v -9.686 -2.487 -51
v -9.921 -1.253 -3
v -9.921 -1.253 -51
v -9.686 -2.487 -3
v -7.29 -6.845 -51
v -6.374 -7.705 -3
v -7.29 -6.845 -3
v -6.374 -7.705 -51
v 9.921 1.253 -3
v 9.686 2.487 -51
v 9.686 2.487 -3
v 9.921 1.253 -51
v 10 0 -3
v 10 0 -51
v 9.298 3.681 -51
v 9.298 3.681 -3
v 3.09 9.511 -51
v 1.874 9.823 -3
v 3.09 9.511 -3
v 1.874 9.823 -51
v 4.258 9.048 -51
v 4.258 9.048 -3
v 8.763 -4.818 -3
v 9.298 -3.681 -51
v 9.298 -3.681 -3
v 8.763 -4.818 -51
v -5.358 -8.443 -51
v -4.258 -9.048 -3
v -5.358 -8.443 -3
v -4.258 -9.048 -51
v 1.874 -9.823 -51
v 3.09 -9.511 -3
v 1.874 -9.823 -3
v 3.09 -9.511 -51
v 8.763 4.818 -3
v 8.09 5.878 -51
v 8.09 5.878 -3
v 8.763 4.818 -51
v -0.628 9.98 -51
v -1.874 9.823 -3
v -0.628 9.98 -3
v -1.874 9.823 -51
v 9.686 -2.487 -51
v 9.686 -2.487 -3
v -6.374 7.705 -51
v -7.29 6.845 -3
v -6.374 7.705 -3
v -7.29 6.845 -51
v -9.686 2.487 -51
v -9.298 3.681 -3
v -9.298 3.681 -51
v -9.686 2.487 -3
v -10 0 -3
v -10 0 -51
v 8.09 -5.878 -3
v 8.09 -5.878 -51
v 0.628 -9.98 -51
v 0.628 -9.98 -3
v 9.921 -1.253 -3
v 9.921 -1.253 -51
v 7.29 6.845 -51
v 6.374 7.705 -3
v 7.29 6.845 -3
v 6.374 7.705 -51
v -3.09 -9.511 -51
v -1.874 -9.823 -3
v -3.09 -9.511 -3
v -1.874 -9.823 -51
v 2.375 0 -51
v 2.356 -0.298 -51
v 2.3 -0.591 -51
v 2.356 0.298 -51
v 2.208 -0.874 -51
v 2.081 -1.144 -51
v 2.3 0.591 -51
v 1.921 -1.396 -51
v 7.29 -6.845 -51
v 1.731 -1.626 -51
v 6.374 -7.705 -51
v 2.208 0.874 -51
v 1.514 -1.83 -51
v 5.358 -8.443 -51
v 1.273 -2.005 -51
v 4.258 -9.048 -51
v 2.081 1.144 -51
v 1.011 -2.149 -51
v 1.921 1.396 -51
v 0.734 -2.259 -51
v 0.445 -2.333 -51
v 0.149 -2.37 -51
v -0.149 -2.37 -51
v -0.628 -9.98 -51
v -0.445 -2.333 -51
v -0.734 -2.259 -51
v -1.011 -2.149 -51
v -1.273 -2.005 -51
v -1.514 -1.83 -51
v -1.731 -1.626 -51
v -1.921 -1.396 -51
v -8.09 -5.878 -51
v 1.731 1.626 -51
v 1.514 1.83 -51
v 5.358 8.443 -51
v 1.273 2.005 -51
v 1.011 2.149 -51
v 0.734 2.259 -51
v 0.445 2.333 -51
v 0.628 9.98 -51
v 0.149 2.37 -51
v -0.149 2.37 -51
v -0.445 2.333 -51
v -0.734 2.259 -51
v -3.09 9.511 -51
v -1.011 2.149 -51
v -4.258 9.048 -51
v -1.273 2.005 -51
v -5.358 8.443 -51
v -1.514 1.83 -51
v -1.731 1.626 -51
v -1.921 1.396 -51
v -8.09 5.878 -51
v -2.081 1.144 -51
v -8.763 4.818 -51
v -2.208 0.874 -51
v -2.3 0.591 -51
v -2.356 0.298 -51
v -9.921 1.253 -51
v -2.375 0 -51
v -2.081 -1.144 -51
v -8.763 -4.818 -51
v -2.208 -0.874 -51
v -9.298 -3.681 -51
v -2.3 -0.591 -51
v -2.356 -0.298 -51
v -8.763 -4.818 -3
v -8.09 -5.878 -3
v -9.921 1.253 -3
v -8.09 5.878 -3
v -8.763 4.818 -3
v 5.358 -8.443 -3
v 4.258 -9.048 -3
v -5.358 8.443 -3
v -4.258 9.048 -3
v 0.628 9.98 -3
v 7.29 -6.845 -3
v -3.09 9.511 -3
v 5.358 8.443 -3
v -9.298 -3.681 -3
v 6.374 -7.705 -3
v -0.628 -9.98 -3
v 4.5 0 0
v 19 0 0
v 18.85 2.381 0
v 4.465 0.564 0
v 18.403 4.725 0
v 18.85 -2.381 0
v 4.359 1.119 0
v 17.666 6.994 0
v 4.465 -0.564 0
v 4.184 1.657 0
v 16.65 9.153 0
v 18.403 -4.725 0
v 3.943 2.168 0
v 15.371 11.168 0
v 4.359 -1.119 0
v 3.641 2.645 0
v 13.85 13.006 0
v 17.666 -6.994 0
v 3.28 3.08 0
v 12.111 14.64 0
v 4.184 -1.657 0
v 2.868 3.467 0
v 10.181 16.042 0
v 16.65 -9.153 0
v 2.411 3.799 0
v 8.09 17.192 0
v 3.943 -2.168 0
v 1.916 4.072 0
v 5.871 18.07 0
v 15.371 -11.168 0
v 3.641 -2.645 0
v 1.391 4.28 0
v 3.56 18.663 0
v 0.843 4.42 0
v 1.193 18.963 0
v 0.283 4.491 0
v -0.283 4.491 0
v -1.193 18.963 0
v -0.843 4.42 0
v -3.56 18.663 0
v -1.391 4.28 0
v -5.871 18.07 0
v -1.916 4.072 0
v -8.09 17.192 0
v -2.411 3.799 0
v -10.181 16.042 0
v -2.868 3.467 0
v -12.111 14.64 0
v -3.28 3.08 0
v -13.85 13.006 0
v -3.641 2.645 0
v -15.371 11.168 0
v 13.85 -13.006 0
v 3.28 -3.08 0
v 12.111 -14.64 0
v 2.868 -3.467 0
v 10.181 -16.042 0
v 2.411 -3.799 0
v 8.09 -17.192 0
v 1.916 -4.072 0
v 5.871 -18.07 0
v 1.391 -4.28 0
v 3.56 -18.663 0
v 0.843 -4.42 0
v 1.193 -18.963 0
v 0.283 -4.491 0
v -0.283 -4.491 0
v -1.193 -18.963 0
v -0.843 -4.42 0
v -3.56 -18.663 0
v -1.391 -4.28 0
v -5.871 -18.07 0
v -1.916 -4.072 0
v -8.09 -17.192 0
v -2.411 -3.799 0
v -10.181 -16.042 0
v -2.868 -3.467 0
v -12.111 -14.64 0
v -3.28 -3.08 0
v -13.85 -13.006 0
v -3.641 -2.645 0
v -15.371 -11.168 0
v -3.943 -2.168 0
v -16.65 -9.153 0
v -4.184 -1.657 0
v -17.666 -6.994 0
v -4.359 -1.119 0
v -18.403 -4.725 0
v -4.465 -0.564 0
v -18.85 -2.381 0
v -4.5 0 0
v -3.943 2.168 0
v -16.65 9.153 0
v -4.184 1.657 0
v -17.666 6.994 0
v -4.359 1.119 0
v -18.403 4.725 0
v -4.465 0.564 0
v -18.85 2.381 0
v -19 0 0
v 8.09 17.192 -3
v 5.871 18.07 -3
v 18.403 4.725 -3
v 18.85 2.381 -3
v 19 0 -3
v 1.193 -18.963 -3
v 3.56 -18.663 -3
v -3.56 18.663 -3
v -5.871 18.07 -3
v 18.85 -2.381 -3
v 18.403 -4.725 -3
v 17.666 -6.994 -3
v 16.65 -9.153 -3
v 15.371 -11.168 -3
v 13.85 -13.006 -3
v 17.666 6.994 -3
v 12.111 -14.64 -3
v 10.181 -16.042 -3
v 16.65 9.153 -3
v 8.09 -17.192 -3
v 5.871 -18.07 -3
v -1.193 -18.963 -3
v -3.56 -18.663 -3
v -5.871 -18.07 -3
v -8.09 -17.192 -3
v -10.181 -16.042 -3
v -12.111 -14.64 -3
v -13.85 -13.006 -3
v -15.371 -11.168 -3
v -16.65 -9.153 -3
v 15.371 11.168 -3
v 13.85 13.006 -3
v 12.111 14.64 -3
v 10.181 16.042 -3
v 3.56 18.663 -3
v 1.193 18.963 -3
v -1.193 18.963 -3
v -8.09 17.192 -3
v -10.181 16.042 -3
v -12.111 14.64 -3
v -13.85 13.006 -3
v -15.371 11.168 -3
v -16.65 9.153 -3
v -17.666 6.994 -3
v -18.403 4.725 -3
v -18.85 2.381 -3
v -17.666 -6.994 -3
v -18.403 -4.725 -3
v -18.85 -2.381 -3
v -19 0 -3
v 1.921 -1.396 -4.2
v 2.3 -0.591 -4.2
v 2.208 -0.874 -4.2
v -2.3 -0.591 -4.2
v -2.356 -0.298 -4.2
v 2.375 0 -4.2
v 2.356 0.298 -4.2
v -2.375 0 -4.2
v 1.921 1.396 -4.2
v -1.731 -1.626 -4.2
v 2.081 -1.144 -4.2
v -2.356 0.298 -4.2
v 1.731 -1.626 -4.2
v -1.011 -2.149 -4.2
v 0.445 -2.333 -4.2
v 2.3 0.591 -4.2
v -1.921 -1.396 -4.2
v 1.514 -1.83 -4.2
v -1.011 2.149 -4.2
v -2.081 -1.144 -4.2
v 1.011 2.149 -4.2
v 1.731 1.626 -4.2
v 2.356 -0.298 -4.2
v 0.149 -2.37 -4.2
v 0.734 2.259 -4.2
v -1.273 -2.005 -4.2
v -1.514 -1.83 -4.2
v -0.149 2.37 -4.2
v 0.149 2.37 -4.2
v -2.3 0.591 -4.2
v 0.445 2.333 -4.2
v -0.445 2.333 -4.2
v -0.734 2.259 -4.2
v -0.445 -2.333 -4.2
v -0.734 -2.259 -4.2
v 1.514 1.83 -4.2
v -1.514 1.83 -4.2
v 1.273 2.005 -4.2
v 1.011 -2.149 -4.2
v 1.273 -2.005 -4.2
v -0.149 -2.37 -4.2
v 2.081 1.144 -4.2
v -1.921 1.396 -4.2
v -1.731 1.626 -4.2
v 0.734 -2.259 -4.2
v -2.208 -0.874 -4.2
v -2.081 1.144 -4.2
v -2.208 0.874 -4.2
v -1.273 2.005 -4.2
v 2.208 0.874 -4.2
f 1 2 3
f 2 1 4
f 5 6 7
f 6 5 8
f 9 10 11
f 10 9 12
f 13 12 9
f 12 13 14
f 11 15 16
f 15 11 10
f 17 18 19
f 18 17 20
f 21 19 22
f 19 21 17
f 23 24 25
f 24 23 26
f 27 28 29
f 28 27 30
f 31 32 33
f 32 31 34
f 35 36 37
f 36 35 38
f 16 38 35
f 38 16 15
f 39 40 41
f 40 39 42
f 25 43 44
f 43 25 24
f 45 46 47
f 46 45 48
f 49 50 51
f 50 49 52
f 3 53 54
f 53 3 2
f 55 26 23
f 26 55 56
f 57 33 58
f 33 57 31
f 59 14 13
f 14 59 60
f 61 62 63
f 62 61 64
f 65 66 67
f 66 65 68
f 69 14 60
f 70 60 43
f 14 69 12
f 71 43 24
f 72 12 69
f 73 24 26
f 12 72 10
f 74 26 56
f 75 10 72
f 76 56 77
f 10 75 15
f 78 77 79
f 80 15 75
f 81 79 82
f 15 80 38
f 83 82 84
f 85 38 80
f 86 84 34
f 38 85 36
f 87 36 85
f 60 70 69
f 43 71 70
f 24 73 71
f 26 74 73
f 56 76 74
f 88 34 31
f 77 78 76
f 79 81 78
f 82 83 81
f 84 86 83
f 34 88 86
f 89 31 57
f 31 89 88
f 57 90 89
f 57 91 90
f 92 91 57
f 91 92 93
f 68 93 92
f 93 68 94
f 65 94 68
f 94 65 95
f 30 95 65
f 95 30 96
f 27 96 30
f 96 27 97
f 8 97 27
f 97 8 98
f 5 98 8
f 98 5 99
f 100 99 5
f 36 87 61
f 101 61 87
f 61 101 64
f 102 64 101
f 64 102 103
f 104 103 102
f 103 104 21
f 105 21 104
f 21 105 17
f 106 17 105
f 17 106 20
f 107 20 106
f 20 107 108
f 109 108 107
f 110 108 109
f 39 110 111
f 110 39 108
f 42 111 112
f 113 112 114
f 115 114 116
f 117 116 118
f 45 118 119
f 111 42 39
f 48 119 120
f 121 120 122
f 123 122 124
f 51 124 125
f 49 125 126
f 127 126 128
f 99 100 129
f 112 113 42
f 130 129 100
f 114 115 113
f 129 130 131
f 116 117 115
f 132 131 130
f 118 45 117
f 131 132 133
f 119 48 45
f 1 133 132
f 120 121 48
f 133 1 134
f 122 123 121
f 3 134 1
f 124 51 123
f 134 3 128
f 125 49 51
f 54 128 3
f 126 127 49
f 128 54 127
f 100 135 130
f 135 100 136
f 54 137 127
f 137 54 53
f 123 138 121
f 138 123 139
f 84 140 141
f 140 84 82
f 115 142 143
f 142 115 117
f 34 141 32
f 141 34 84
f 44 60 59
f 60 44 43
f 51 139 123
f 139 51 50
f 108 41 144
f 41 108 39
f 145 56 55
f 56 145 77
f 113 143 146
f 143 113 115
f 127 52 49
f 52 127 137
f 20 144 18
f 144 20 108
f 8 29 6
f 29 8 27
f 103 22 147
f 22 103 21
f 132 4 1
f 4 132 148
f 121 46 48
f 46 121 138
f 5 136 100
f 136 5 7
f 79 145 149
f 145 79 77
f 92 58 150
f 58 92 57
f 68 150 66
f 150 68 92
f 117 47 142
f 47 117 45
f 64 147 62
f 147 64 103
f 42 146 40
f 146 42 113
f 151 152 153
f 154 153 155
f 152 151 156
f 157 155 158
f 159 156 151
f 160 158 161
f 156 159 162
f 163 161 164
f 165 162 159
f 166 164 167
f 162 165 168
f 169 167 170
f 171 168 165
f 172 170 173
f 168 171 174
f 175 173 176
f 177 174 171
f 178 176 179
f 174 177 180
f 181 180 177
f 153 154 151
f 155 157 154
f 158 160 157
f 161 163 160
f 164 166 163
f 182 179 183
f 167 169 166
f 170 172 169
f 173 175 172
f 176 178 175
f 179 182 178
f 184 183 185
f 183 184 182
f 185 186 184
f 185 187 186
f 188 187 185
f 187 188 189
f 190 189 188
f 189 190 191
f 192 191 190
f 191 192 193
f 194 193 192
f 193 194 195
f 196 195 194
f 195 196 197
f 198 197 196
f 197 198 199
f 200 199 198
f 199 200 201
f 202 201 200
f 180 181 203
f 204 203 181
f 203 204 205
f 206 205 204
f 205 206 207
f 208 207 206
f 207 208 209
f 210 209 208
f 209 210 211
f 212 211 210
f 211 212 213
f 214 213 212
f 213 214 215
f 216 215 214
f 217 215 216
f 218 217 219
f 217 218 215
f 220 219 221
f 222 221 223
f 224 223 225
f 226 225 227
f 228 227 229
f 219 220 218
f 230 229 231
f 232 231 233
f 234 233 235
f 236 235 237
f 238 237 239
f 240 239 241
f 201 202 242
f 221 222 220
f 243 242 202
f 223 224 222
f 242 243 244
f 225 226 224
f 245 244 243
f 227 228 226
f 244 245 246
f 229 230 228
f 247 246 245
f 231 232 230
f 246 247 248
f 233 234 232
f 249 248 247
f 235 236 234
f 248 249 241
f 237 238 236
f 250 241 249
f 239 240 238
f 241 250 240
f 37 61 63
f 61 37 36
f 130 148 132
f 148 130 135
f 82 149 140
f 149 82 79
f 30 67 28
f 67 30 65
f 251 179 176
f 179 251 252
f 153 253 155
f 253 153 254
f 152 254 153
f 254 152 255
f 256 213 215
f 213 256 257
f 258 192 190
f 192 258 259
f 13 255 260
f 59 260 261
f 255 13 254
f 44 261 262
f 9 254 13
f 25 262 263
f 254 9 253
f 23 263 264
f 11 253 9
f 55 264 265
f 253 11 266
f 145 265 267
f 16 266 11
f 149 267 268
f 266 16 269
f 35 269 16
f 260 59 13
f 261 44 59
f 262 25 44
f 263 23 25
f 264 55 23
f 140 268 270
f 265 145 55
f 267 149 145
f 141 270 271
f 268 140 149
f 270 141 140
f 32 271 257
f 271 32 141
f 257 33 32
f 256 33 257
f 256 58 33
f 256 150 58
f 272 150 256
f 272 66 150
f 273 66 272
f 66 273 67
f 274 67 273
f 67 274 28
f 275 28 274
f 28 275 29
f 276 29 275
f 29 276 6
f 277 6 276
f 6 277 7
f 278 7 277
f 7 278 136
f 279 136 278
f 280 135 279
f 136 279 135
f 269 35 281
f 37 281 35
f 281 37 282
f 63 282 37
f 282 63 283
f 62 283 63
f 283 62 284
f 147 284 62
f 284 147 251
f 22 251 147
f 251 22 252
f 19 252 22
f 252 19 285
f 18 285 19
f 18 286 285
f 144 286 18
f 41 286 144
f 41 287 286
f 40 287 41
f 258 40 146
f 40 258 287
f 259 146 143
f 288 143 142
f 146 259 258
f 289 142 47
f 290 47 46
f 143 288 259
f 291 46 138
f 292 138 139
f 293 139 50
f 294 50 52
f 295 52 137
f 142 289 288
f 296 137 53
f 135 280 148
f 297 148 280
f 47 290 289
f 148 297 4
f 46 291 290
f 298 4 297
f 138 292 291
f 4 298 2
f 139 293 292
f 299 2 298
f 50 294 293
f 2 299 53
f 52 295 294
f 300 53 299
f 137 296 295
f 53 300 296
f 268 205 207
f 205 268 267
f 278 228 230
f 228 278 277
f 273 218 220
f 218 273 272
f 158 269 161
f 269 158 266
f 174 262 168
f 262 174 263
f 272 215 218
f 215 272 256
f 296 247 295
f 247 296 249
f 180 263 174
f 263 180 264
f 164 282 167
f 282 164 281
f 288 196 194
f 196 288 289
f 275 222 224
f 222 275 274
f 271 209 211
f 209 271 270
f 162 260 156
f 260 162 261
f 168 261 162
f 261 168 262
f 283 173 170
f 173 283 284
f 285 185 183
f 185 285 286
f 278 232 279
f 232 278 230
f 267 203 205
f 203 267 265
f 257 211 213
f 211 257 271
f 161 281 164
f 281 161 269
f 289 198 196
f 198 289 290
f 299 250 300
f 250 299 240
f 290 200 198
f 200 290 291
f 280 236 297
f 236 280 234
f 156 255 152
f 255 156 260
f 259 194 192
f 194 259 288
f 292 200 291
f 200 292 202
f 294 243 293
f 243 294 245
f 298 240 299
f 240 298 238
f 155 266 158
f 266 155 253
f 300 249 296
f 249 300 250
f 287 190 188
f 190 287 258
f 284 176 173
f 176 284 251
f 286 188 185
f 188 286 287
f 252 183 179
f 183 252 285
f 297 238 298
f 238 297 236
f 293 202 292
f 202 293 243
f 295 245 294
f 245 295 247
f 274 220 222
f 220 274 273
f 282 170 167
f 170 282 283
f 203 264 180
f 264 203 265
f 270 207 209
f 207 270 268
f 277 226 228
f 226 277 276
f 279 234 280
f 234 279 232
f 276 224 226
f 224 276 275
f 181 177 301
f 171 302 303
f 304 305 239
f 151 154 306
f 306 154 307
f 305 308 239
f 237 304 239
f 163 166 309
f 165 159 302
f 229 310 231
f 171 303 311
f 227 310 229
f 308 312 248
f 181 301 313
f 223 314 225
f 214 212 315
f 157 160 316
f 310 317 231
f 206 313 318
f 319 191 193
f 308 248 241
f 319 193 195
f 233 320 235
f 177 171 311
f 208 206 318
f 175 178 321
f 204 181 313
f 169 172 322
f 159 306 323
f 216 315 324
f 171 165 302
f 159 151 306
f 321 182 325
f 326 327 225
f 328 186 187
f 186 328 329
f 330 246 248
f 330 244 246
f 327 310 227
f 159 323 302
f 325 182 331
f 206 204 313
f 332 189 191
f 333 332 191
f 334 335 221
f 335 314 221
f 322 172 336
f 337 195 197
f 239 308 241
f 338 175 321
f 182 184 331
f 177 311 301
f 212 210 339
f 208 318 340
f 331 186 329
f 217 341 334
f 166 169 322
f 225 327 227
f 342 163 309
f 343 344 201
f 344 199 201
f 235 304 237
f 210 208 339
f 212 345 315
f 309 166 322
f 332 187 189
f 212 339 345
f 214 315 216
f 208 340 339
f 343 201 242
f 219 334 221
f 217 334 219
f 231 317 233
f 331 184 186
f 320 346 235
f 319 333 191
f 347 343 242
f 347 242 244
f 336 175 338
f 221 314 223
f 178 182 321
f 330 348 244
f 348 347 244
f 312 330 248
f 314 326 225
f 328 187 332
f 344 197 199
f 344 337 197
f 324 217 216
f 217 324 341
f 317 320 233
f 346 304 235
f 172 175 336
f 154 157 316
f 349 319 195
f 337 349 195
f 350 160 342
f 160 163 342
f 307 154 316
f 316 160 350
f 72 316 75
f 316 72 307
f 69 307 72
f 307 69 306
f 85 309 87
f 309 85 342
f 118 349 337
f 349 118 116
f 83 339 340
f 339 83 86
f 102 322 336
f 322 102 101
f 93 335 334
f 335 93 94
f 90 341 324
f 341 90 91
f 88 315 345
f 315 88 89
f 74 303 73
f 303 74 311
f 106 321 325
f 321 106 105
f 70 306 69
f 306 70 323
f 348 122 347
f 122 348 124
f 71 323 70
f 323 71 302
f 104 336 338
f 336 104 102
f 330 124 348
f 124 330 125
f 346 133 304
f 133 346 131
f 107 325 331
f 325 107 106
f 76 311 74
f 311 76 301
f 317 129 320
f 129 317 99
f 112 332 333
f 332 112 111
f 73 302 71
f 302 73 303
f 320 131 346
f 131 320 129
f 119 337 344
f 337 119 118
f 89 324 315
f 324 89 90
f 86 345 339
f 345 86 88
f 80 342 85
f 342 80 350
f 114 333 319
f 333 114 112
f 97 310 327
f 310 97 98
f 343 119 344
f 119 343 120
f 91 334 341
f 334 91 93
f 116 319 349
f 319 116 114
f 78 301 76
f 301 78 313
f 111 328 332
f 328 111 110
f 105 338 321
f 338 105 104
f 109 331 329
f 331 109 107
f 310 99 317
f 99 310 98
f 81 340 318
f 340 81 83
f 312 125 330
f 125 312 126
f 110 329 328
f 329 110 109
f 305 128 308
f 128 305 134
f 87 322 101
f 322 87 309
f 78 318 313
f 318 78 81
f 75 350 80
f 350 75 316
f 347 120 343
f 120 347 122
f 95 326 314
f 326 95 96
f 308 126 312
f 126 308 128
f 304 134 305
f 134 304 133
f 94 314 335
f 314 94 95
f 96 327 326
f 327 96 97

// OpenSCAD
$fn = 50;


difference() {
	union() {
		translate(v = [0, 0, -51.0000000000]) {
			cylinder(h = 51, r = 10.0000000000);
		}
		translate(v = [0, 0, -3.0000000000]) {
			cylinder(h = 3, r = 19.0000000000);
		}
	}
	union() {
		translate(v = [0, 0, 0]) {
			rotate(a = [0, 0, 0]) {
				difference() {
					union() {
						#translate(v = [0, 0, -51.0000000000]) {
							cylinder(h = 51, r = 2.2500000000);
						}
						#translate(v = [0, 0, -4.2000000000]) {
							cylinder(h = 4.2000000000, r = 10.0000000000, r1 = 2.3750000000, r2 = 4.5000000000);
						}
						#translate(v = [0, 0, -51.0000000000]) {
							cylinder(h = 51, r = 2.3750000000);
						}
						#translate(v = [0, 0, -51.0000000000]) {
							cylinder(h = 51, r = 2.2500000000);
						}
					}
					union();
				}
			}
		}
	}
}
